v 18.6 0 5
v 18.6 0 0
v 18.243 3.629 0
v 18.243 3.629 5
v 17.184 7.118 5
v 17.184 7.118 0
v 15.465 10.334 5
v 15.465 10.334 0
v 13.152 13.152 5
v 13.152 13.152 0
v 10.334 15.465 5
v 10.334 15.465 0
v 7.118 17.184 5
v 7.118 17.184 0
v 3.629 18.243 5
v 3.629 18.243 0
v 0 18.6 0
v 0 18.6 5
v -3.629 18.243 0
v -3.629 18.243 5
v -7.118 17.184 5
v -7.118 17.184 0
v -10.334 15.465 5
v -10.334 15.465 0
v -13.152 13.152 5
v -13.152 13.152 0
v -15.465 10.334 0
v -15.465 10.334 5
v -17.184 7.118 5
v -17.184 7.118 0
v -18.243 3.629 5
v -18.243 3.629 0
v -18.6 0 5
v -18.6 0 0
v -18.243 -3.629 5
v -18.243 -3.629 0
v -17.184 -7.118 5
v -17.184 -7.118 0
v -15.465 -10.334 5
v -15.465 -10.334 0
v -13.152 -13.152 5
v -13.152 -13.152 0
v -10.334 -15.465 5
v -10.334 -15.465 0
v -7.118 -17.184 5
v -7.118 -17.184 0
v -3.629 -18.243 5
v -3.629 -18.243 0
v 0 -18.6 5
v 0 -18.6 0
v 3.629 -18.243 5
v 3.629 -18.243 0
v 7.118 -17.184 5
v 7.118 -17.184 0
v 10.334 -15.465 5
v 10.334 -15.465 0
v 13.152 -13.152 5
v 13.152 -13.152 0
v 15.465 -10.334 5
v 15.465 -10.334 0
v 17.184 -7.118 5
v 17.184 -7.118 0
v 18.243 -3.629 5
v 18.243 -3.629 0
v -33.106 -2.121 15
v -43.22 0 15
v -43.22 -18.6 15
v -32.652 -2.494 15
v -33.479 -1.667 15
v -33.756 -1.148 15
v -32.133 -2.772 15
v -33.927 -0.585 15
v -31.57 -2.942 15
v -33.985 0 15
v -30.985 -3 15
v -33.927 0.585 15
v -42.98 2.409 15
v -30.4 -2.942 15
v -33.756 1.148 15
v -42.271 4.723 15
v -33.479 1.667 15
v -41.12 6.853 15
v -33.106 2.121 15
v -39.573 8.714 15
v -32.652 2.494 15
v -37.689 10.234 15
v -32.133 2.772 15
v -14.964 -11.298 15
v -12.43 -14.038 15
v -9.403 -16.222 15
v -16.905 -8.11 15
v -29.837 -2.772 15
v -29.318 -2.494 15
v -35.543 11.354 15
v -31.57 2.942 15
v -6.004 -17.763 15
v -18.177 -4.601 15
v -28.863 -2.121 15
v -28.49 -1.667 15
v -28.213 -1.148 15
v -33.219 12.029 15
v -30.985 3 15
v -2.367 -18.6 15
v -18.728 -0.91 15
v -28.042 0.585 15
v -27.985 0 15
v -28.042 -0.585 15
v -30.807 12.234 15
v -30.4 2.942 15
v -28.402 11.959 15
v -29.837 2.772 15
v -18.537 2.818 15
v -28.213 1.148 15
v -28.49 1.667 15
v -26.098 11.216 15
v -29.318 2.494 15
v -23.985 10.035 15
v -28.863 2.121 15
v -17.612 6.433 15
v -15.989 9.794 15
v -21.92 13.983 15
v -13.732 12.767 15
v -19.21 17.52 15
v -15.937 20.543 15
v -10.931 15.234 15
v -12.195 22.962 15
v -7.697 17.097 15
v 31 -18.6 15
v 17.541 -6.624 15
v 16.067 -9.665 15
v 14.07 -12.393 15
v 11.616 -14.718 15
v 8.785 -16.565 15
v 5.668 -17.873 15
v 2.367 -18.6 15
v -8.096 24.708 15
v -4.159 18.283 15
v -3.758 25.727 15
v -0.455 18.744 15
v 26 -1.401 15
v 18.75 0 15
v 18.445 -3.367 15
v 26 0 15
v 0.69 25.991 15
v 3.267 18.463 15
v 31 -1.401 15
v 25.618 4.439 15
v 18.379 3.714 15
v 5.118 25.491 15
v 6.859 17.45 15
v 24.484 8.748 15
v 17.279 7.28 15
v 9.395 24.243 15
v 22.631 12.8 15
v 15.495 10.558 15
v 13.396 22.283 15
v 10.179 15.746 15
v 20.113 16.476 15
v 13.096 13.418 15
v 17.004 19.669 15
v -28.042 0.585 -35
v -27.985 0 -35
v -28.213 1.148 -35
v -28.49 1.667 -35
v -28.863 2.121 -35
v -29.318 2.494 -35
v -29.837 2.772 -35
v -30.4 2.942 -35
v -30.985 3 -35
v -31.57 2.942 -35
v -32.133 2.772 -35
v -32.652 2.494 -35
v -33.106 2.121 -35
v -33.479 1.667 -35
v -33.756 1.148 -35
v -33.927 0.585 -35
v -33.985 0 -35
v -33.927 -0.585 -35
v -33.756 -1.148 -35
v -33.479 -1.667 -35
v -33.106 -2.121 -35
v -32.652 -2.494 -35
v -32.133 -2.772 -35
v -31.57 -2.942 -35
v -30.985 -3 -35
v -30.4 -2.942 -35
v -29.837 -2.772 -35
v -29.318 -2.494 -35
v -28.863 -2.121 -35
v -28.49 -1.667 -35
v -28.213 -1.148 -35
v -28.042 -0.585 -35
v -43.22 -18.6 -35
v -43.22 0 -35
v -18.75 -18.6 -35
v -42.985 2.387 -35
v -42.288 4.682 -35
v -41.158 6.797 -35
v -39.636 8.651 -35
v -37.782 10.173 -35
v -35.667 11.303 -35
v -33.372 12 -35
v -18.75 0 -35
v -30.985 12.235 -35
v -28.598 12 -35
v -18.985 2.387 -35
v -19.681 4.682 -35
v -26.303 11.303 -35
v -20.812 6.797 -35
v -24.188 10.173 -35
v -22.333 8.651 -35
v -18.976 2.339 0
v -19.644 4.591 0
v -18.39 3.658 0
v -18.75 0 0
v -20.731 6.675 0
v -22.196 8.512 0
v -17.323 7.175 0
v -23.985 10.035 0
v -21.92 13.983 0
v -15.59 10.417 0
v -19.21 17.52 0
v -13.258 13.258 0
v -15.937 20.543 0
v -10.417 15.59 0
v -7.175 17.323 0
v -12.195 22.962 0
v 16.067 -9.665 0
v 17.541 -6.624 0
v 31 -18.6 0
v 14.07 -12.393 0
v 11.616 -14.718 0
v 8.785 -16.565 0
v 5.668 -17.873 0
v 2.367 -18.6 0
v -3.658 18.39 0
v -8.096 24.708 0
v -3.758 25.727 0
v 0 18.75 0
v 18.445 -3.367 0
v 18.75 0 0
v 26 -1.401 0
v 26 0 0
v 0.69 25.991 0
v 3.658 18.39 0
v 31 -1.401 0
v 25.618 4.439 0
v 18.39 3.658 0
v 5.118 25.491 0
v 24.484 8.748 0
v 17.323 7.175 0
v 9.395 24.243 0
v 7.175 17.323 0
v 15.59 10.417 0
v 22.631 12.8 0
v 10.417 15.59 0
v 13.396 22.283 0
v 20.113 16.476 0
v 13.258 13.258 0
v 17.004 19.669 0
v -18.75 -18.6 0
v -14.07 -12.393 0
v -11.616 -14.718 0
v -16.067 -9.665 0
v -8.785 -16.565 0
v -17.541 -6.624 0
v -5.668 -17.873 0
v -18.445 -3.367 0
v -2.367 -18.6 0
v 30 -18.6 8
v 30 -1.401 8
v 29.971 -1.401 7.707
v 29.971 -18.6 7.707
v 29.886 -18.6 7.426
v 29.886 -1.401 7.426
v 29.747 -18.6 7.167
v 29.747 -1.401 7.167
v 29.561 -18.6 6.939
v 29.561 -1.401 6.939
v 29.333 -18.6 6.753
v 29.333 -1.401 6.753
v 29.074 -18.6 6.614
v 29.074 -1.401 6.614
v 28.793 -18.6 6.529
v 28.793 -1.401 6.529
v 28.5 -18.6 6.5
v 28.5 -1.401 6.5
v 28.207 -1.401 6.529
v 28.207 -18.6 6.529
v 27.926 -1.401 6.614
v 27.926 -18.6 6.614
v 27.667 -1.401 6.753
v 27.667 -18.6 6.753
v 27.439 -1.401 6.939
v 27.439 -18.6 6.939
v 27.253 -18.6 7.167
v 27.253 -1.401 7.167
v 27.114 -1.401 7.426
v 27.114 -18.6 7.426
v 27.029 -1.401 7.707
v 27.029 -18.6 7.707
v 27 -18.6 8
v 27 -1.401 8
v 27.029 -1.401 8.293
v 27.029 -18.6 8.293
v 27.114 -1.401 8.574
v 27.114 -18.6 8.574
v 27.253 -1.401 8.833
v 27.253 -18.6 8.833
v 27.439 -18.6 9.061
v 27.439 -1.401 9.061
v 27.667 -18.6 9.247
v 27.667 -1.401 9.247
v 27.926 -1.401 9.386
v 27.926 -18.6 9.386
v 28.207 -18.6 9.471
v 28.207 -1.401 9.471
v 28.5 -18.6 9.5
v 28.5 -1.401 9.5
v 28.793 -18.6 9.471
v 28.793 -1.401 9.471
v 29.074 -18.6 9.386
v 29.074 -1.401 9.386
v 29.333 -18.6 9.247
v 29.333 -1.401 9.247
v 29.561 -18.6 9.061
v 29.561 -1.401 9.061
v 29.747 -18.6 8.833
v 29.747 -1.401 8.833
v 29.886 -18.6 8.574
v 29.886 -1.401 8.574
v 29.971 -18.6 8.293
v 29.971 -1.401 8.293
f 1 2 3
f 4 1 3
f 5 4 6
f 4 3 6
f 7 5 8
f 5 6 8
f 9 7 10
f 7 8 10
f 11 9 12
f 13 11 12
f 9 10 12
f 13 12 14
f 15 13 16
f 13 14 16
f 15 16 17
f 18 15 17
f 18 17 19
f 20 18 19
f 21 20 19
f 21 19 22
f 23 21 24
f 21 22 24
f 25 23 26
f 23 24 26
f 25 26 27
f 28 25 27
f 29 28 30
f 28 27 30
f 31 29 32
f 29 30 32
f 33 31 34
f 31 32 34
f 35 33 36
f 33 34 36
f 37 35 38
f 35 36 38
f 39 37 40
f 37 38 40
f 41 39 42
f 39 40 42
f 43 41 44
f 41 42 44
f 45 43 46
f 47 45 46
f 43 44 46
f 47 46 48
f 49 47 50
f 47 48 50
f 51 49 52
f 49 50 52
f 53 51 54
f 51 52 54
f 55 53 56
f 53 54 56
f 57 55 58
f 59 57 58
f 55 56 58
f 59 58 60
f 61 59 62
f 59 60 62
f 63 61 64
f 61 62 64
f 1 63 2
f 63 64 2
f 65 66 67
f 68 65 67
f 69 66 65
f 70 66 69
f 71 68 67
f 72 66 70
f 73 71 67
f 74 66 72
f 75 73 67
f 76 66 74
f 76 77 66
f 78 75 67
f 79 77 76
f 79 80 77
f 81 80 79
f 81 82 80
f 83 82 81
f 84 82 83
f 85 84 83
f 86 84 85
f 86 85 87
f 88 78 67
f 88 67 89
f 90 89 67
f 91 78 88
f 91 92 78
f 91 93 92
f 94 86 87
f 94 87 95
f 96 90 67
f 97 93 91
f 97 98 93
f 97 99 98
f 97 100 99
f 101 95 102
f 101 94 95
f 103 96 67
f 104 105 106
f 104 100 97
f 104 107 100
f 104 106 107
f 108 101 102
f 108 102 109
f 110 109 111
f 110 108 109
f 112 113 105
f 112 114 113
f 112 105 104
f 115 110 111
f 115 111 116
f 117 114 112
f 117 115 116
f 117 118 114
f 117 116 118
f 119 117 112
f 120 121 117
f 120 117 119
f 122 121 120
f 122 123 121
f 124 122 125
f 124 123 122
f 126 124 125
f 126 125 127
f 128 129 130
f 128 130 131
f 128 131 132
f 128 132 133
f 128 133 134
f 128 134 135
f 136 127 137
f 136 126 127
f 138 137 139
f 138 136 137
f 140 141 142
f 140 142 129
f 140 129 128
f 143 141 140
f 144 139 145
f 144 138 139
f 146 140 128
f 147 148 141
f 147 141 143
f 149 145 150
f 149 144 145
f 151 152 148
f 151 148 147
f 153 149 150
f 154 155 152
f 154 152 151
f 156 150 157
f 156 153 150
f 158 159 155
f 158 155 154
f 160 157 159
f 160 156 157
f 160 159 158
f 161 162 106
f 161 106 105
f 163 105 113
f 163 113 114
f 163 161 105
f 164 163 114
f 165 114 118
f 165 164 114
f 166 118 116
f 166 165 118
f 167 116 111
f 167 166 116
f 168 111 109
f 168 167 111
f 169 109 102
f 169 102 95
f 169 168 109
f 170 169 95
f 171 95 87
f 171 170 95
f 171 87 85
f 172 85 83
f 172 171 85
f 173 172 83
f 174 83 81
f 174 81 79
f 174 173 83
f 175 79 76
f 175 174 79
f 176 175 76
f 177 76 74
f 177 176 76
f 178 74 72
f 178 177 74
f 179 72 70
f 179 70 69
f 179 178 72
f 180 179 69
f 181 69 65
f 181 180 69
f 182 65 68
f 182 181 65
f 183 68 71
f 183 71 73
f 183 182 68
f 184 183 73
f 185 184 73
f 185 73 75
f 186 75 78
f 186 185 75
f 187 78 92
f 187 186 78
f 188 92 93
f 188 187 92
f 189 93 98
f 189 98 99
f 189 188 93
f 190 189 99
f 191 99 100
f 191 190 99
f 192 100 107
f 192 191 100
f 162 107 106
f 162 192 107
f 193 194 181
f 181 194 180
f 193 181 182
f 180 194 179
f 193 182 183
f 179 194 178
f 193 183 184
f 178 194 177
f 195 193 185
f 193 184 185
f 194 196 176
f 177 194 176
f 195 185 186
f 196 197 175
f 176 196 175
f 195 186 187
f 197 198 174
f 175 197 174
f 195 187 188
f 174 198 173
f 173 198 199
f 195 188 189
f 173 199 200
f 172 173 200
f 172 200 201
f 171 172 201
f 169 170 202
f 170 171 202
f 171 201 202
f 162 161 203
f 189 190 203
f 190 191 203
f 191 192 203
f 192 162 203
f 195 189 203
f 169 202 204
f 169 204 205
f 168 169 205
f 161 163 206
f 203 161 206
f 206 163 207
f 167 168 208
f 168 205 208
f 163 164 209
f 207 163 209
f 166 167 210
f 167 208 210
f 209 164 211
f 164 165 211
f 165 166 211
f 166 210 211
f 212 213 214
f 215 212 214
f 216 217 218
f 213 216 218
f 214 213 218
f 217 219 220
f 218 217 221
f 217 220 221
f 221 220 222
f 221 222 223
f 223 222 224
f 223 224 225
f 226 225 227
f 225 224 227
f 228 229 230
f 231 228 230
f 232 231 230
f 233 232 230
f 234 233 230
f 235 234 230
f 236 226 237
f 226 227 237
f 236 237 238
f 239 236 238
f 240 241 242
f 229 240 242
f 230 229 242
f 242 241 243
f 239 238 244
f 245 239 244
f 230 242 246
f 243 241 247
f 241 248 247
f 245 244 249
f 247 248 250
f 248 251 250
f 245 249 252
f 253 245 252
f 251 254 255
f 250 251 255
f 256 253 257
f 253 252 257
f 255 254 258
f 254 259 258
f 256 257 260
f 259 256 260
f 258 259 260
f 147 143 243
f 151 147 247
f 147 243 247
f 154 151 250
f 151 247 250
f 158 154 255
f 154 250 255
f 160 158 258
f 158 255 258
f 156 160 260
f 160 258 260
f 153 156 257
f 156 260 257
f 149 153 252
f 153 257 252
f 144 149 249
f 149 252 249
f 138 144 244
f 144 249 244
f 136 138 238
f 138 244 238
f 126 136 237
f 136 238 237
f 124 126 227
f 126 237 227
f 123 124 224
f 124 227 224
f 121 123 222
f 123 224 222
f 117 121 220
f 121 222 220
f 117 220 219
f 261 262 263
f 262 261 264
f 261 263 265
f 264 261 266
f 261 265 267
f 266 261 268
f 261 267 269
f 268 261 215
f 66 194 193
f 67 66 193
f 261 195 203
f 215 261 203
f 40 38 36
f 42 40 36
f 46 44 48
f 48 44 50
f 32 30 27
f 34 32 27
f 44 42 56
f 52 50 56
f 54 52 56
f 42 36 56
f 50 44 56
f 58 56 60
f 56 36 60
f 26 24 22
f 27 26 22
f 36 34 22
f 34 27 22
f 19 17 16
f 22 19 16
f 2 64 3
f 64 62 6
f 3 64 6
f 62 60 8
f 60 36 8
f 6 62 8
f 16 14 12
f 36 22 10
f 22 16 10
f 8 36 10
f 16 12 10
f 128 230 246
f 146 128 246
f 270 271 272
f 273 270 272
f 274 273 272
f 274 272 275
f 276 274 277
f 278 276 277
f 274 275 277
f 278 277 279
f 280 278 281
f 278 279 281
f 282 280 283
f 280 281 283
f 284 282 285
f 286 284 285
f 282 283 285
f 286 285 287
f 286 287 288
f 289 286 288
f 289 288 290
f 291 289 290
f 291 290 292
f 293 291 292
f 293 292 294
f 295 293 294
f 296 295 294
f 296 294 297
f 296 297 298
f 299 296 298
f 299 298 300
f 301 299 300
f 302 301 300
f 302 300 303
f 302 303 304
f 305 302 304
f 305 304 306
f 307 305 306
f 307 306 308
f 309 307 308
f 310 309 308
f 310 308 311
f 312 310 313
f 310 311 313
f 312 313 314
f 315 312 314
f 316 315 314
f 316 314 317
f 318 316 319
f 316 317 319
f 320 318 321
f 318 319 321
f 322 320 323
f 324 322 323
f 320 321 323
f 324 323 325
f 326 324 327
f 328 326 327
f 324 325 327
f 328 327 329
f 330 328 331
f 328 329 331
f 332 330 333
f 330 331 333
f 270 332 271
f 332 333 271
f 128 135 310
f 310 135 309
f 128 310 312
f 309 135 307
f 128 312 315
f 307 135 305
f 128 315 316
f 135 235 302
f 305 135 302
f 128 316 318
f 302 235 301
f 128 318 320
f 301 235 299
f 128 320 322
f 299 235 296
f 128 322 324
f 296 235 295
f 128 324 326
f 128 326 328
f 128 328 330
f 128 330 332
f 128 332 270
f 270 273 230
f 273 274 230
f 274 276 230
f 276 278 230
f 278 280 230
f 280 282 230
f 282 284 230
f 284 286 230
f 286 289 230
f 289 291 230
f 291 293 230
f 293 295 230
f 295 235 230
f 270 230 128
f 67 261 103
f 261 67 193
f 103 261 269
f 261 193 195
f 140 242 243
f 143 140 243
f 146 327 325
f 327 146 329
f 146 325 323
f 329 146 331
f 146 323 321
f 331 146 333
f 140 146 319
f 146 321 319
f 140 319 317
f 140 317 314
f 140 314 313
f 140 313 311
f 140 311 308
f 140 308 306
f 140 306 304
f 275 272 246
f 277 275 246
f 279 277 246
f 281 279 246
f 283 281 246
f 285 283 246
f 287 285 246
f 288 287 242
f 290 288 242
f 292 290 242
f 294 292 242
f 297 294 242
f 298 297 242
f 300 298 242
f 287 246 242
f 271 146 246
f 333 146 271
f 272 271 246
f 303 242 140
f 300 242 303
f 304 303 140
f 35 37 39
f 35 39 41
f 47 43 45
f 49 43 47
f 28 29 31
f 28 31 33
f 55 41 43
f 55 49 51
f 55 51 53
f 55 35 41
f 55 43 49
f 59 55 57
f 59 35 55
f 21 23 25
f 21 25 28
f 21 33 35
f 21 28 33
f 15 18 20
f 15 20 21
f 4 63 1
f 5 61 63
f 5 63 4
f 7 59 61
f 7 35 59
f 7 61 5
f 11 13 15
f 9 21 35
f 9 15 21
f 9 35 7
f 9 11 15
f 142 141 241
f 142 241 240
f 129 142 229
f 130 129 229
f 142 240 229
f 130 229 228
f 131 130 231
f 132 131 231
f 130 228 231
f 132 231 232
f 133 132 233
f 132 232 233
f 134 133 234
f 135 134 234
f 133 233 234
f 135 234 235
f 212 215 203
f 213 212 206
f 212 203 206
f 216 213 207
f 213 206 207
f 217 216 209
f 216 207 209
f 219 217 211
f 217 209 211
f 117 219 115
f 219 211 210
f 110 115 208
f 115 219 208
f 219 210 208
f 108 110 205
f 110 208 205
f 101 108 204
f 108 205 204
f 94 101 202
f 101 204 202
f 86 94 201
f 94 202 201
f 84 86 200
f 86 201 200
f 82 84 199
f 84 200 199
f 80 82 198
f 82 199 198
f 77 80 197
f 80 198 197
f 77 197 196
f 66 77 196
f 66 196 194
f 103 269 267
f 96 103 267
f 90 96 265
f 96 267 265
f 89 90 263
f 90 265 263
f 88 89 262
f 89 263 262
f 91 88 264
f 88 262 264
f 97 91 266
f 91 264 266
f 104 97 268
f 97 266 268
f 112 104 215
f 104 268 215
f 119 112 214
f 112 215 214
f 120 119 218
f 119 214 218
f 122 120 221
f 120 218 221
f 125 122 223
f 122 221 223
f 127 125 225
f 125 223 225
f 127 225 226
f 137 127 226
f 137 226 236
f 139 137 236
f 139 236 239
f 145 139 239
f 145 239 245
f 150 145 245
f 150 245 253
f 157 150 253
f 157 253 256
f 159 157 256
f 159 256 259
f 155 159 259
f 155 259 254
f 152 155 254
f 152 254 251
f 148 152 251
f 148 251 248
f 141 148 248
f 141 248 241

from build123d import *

# Parameters (mm, degrees)
BOSS_EXTRUDE1_DEPTH = 5
BOSS_EXTRUDE2_DEPTH = 15
SKETCH2_R           = 1.5
CUT_EXTRUDE1_DEPTH  = 20
BOSS_EXTRUDE3_START = -35
SKETCH3_R           = 3
BOSS_EXTRUDE3_DEPTH = 50


with BuildPart() as part:
    # Sketch1 → Boss-Extrude1 (new body)
    with BuildSketch(Plane.XY):
        with BuildLine():
            ThreePointArc((18.6, 0), (-13.152186141, 13.152186119), (3.1e-08, -18.6))
            ThreePointArc((3.1e-08, -18.6), (13.152186141, -13.152186119), (18.6, 0))
        make_face()
    extrude(amount=BOSS_EXTRUDE1_DEPTH)


with BuildPart() as body_2:
    # Sketch1<3> → Boss-Extrude2 (new body)
    with BuildSketch(Plane.XY):
        with BuildLine():
            ThreePointArc((26, 0), (0, 26), (-26, 0))
            Line((-26, 0), (-26, -1.40113329))
            Line((-26, -1.40113329), (-26, -18.6))
            Line((-26, -18.6), (-2.366960076, -18.6))
            ThreePointArc((-2.366960076, -18.6), (-12.393183582, 14.070234565), (18.75, 0))
            ThreePointArc((18.75, 0), (14.070234565, -12.393183582), (2.366960076, -18.6))
            Line((2.366960076, -18.6), (31, -18.6))
            Line((31, -18.6), (31, -1.40113329))
            Line((31, -1.40113329), (26, -1.40113329))
            Line((26, -1.40113329), (26, 0))
        make_face()
    extrude(amount=BOSS_EXTRUDE2_DEPTH)

    # Sketch2 → Cut-Extrude1 (cut)
    with BuildSketch(Plane(origin=(0, 0, 0), x_dir=(1, 0, 0), z_dir=(0, 1, 0))):
        with Locations((-28.5, -8)):
            Circle(SKETCH2_R)
        with Locations((28.5, -8)):
            Circle(SKETCH2_R)
    extrude(amount=-CUT_EXTRUDE1_DEPTH, mode=Mode.SUBTRACT)

    # Sketch3 → Boss-Extrude3 (add)
    with BuildSketch(Plane.XY.offset(BOSS_EXTRUDE3_START)):
        with BuildLine():
            ThreePointArc((-18.75, 0), (-30.984795994, 12.234795994), (-43.219591988, 0))
            Line((-43.219591988, 0), (-43.219591988, -18.6))
            Line((-43.219591988, -18.6), (-24.525129365, -18.6))
            Line((-24.525129365, -18.6), (-18.75, -18.6))
            Line((-18.75, -18.6), (-18.75, 0))
        make_face()
        with Locations((-30.984795994, 0)):
            Circle(SKETCH3_R, mode=Mode.SUBTRACT)
    extrude(amount=BOSS_EXTRUDE3_DEPTH)


solid = Compound([part.part, body_2.part])
